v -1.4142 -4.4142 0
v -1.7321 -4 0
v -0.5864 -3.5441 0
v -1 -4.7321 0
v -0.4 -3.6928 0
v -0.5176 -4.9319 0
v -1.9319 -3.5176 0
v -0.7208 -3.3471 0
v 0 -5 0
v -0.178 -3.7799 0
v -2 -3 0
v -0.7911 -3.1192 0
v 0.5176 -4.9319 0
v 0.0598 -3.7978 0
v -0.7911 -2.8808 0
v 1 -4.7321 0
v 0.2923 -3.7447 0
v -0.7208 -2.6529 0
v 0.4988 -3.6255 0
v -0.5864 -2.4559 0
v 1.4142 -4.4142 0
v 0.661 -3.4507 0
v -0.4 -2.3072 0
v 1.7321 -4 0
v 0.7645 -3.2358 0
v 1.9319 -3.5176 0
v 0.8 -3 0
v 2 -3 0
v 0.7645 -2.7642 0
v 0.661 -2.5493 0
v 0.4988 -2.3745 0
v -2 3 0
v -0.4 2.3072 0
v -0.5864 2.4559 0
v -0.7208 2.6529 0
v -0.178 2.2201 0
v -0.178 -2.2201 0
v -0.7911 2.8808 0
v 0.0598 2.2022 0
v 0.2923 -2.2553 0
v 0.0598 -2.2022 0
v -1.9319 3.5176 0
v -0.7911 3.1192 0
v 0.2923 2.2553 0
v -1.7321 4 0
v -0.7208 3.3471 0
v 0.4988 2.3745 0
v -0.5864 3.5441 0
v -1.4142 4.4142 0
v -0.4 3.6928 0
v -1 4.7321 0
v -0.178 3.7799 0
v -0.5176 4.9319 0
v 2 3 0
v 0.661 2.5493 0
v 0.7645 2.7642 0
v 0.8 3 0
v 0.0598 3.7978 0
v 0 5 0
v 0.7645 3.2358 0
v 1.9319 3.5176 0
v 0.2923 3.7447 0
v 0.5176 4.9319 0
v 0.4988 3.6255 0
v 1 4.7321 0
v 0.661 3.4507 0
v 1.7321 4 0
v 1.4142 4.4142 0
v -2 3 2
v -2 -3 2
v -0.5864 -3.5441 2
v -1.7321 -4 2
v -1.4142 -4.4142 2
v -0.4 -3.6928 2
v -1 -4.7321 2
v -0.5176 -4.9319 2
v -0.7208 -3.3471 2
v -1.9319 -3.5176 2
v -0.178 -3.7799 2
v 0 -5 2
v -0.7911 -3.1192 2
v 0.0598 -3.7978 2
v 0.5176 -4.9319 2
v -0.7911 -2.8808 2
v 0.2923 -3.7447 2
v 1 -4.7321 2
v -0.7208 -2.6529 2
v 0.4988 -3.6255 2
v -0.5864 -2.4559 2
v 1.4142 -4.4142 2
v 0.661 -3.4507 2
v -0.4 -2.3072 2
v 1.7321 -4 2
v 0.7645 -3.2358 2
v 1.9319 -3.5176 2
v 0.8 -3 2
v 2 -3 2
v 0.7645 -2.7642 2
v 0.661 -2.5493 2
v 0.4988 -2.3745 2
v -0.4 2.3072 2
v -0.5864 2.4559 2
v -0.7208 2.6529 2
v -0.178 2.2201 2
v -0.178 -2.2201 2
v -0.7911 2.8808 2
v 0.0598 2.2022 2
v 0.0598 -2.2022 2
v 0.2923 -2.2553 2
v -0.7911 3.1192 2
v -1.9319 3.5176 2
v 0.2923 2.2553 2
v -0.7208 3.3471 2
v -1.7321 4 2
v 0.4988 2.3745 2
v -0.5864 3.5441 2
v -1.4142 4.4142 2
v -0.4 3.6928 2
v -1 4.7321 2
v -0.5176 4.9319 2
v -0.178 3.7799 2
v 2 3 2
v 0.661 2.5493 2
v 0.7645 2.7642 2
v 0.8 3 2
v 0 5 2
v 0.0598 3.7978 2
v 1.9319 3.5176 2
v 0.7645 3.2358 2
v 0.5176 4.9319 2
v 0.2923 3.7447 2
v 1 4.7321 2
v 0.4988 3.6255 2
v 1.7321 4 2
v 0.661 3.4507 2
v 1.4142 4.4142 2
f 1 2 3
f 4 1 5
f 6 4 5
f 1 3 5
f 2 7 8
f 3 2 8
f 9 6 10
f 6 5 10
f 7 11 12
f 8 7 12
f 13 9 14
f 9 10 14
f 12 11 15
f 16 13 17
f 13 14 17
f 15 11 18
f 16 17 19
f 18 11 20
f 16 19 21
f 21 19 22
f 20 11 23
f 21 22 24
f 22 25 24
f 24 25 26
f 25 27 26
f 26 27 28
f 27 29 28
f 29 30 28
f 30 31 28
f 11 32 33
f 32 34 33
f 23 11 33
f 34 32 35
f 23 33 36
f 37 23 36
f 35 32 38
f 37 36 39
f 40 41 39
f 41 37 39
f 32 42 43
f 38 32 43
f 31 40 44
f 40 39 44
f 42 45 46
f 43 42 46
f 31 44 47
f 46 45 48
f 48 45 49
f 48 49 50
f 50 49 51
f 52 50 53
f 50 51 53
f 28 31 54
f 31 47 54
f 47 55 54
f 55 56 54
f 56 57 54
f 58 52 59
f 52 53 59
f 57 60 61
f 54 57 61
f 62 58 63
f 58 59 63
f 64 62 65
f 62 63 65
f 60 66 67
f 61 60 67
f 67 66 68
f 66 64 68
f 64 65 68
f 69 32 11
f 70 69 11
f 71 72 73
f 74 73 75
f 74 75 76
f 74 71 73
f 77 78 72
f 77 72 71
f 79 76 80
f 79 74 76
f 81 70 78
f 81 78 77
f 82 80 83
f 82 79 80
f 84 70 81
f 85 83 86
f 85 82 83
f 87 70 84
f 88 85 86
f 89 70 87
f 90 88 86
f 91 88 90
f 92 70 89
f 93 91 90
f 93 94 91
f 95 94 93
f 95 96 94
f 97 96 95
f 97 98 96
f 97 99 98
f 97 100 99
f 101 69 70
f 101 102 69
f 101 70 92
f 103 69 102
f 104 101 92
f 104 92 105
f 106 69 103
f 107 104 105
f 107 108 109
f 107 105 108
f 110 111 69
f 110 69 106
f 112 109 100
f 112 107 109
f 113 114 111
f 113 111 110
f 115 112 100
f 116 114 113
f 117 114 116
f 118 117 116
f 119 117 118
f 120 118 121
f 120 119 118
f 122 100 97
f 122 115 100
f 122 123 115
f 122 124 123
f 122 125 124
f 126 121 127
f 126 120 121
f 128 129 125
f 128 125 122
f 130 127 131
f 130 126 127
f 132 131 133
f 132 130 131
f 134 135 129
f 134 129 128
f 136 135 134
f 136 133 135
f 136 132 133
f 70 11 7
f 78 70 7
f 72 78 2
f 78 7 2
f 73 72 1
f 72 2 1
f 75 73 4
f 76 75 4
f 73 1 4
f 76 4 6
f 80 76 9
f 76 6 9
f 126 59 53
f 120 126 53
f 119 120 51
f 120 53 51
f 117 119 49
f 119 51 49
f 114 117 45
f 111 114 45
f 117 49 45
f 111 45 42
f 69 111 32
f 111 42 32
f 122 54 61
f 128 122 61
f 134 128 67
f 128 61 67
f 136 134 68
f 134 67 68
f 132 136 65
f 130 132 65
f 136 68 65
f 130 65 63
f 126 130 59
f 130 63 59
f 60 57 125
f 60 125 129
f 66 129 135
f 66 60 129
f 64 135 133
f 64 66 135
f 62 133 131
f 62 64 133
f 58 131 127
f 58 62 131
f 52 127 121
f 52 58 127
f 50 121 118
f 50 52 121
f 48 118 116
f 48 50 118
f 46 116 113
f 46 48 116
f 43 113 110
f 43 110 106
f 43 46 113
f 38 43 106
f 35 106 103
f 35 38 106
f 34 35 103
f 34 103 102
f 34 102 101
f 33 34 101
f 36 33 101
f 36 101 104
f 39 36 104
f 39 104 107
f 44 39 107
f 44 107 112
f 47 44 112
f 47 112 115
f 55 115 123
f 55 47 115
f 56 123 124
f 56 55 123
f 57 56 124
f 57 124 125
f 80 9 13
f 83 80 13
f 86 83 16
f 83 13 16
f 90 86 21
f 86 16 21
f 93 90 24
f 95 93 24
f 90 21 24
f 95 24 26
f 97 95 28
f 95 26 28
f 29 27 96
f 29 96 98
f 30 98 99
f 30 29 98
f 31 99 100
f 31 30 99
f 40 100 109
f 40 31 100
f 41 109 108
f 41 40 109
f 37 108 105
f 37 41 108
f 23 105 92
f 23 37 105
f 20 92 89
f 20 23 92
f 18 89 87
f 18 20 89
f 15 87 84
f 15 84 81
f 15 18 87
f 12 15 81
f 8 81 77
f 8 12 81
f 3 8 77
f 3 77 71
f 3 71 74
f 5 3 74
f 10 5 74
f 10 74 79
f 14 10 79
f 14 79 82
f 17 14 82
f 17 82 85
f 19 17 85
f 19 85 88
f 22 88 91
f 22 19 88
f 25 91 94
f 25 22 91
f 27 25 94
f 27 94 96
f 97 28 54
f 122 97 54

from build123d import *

# Parameters (mm, degrees)
F0_R     = 0.8
F1_DEPTH = 2


with BuildPart() as f1:
    # F0 (on Top) → F1 (new body)
    with BuildSketch(Plane.XY):
        with BuildLine():
            ThreePointArc((2, 3), (1.4142135624, 4.4142135624), (0, 5))
            ThreePointArc((0, 5), (-1.4142135624, 4.4142135624), (-2, 3))
            ThreePointArc((-2, 3), (0, 1), (2, 3))
        make_face()
        with Locations((0, 3)):
            Circle(F0_R, mode=Mode.SUBTRACT)
        with BuildLine():
            ThreePointArc((2, 3), (0, 1), (-2, 3))
            Line((-2, 3), (-2, -3))
            ThreePointArc((-2, -3), (0, -1), (2, -3))
            Line((2, -3), (2, 3))
        make_face()
        with BuildLine():
            ThreePointArc((2, -3), (0, -1), (-2, -3))
            ThreePointArc((-2, -3), (-1.4142135624, -4.4142135624), (0, -5))
            ThreePointArc((0, -5), (1.4142135624, -4.4142135624), (2, -3))
        make_face()
        with Locations((0, -3)):
            Circle(F0_R, mode=Mode.SUBTRACT)
    extrude(amount=F1_DEPTH)


solid = f1.part
